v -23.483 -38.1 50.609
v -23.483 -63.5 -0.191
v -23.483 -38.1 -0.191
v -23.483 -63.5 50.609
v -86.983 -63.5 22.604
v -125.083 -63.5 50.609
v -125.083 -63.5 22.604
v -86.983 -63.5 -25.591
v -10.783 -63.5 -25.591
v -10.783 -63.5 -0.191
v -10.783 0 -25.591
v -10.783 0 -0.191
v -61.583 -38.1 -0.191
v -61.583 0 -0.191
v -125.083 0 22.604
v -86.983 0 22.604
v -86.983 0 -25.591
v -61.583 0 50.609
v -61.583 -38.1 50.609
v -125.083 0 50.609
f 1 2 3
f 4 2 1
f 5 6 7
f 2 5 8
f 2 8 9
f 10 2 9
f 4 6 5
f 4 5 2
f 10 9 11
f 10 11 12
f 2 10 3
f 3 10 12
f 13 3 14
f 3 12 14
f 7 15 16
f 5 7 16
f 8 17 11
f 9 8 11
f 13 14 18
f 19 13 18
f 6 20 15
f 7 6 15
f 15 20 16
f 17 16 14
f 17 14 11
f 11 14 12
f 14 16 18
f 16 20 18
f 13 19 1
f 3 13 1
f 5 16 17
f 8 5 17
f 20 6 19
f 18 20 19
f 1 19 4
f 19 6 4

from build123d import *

# Parameters (mm, degrees)
F1_DEPTH = 63.5
F2_W     = 38.1
F2_H     = 50.8
F3_DEPTH = 25.4


with BuildPart() as f1:
    # F0 (on Front) → F1 (new body)
    with BuildSketch(Plane.XZ):
        Polygon((-86.982761, -25.590784), (-10.782761, -25.590784), (-10.782761, -0.190784), (-61.582761, -0.190784), (-61.582761, 50.609216), (-86.982761, 50.609216), (-125.082761, 50.609216), (-125.082761, 22.604095), (-86.982761, 22.604095), align=None)
    extrude(amount=F1_DEPTH)

    # F2 (on face) → F3 (join)
    with BuildSketch(Plane.XZ.offset(63.5)):
        with Locations((-42.532761, 25.209216)):
            Rectangle(F2_W, F2_H)
    extrude(amount=-F3_DEPTH)


solid = f1.part
